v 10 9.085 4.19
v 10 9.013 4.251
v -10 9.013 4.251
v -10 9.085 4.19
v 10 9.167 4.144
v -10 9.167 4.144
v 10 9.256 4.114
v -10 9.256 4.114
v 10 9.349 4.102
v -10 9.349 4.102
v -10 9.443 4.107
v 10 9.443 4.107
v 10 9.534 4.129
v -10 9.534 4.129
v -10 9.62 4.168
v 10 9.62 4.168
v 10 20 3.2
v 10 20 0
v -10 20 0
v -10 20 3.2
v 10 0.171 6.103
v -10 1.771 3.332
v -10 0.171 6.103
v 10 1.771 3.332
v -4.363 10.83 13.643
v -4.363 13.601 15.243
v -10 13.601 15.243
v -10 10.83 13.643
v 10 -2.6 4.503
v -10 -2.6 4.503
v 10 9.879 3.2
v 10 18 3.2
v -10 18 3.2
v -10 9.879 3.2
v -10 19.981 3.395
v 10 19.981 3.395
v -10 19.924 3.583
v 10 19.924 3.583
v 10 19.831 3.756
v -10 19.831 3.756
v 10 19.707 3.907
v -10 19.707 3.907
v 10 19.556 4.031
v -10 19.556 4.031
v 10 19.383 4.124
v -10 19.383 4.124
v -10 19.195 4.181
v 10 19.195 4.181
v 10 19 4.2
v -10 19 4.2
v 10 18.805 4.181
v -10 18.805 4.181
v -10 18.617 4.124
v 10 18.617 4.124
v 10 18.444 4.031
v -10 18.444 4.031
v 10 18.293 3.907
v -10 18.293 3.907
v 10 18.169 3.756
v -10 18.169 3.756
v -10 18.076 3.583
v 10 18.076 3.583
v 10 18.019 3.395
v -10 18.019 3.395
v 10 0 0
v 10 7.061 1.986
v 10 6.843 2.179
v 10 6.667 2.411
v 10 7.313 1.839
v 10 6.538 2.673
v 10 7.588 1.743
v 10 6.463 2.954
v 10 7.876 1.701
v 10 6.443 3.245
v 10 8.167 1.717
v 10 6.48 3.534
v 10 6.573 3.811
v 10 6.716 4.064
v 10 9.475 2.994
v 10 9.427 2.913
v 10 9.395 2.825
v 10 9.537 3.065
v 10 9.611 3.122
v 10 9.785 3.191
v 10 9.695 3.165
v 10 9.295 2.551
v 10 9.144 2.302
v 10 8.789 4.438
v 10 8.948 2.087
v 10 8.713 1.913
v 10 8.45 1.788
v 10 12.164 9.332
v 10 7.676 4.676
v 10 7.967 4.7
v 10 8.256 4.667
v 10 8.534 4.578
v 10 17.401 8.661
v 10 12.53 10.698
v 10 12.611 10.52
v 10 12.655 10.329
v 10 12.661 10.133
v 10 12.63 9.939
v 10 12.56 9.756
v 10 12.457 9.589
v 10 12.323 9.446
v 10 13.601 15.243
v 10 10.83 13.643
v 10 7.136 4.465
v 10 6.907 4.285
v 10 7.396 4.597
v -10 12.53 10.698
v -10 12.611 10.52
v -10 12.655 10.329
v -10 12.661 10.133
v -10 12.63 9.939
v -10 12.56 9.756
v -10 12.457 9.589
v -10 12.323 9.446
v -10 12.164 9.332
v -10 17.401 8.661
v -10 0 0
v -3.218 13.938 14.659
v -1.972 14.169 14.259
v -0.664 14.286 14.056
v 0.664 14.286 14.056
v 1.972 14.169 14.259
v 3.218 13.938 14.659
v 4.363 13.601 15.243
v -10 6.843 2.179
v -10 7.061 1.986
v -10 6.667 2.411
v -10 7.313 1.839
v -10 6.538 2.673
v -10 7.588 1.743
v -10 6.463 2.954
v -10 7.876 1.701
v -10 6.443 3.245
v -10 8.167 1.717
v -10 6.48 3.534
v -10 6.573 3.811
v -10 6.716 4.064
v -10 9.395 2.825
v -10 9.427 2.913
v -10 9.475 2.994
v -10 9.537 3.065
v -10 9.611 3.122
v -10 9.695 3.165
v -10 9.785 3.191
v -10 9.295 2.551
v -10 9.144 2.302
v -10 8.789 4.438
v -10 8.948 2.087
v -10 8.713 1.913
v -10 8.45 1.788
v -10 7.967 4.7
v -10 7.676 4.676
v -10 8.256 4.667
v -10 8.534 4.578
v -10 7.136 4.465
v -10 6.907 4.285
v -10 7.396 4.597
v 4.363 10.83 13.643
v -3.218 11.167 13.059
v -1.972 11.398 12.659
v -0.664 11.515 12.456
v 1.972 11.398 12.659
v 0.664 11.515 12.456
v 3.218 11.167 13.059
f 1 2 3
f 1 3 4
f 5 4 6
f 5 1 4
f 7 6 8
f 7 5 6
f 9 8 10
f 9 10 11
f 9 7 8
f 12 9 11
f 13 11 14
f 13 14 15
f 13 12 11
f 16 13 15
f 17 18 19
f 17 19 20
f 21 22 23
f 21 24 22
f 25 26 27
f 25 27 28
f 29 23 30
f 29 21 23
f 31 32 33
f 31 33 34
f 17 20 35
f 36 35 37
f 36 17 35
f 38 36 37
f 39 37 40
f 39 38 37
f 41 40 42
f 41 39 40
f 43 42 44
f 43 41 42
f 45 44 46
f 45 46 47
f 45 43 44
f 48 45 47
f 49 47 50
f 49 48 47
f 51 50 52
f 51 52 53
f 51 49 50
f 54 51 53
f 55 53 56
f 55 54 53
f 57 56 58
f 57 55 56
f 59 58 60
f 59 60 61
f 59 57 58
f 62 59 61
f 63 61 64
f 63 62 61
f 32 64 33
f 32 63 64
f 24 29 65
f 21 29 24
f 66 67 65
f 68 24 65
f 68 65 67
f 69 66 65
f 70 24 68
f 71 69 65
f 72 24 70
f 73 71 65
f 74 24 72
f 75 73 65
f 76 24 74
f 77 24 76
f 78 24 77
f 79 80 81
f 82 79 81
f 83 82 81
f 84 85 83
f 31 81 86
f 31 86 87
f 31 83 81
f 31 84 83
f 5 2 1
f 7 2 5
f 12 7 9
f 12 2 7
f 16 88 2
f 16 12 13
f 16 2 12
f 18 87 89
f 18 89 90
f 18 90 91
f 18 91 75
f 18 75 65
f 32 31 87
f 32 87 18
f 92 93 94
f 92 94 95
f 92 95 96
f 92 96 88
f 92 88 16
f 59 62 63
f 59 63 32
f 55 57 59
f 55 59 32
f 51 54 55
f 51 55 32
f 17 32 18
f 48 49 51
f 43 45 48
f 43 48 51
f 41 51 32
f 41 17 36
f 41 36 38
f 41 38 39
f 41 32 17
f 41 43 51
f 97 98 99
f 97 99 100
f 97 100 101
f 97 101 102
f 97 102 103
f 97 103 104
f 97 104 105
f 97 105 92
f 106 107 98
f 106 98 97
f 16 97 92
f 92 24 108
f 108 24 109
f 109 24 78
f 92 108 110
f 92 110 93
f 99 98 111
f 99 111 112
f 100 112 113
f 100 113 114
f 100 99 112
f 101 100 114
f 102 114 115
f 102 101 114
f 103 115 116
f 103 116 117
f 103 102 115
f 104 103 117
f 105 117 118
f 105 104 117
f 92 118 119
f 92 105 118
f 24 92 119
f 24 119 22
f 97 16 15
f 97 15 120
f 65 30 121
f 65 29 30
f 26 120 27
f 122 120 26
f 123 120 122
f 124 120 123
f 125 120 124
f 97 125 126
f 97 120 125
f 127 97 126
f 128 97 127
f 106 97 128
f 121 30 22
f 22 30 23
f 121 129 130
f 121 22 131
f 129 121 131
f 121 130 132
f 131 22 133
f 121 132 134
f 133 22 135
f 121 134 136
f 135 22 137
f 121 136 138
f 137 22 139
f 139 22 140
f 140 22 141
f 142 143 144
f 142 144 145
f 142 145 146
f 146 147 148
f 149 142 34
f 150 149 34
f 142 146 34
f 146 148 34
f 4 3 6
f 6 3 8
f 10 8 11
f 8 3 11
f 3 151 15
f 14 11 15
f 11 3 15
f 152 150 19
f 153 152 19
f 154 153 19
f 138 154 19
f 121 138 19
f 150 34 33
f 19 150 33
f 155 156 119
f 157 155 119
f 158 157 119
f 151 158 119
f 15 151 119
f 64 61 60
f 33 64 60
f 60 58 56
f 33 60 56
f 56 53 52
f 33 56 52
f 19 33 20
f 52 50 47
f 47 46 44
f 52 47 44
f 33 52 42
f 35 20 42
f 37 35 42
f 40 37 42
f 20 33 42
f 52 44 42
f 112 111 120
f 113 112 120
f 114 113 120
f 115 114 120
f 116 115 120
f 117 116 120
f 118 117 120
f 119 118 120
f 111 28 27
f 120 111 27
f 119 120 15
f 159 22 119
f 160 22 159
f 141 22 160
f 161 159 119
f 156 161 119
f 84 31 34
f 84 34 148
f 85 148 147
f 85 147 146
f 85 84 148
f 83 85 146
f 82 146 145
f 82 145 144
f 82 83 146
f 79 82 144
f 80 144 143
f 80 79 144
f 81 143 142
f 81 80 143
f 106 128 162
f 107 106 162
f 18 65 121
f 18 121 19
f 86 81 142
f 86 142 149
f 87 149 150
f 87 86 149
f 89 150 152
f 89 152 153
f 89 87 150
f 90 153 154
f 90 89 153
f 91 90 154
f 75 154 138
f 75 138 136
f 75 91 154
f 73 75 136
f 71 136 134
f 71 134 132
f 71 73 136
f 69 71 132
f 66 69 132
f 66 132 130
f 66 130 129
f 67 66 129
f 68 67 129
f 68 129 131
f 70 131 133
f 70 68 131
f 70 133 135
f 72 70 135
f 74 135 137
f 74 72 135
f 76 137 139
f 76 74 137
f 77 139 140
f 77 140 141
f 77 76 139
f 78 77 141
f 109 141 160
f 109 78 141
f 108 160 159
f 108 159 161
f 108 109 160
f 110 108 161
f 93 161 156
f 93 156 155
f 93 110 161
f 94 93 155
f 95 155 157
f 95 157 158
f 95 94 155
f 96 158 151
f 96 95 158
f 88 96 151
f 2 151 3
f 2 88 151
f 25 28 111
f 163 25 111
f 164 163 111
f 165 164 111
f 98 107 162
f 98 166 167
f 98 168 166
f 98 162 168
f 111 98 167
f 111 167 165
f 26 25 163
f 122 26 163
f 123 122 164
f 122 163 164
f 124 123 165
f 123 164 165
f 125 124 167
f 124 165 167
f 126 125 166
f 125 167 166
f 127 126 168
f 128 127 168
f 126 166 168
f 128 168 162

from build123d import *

# Parameters (mm, degrees)
F1_DEPTH = 10
F3_DEPTH = 3.2


with BuildPart() as f1:
    # F0 (on Right) → F1 (new body, symmetric)
    with BuildSketch(Plane.YZ):
        with BuildLine():
            Line((-2.6, 4.5033320997), (0, 0))
            Line((0, 0), (20, 0))
            Line((20, 0), (20, 3.2))
            ThreePointArc((20, 3.2), (19, 4.2), (18, 3.2))
            Line((18, 3.2), (9.8790542573, 3.2))
            ThreePointArc((9.8790542573, 3.2), (9.5728680395, 3.0952847075), (9.394931339, 2.825))
            ThreePointArc((9.394931339, 2.825), (6.4936738448, 2.8117714323), (9.0128508216, 4.2509439038))
            ThreePointArc((9.0128508216, 4.2509439038), (9.3020908782, 4.1058388311), (9.6196135673, 4.1682458366))
            Line((9.6196135673, 4.1682458366), (17.4008928334, 8.6607695155))
            Line((17.4008928334, 8.6607695155), (13.6008928334, 15.2425625842))
            Line((13.6008928334, 15.2425625842), (10.8296115413, 13.6425625842))
            Line((10.8296115413, 13.6425625842), (12.5296115413, 10.6980762114))
            ThreePointArc((12.5296115413, 10.6980762114), (12.6295119638, 9.9392571663), (12.1635861375, 9.3320508076))
            Line((12.1635861375, 9.3320508076), (1.7712812921, 3.3320508076))
            Line((1.7712812921, 3.3320508076), (0.1712812921, 6.1033320997))
            Line((0.1712812921, 6.1033320997), (-2.6, 4.5033320997))
        make_face()
    extrude(amount=F1_DEPTH, both=True)

    # F2 (on face) → F3 (cut, through all)
    with BuildSketch(Plane(origin=(0, 14.0296115413, 8.1), x_dir=(1, 0, 0), z_dir=(0, -0.8660254038, -0.5))):
        with BuildLine():
            Line((4.3634848459, 6.4), (-4.3634848459, 6.4))
            ThreePointArc((-4.3634848459, 6.4), (0, 5), (4.3634848459, 6.4))
        make_face()
    extrude(amount=-F3_DEPTH, mode=Mode.SUBTRACT)


solid = f1.part
